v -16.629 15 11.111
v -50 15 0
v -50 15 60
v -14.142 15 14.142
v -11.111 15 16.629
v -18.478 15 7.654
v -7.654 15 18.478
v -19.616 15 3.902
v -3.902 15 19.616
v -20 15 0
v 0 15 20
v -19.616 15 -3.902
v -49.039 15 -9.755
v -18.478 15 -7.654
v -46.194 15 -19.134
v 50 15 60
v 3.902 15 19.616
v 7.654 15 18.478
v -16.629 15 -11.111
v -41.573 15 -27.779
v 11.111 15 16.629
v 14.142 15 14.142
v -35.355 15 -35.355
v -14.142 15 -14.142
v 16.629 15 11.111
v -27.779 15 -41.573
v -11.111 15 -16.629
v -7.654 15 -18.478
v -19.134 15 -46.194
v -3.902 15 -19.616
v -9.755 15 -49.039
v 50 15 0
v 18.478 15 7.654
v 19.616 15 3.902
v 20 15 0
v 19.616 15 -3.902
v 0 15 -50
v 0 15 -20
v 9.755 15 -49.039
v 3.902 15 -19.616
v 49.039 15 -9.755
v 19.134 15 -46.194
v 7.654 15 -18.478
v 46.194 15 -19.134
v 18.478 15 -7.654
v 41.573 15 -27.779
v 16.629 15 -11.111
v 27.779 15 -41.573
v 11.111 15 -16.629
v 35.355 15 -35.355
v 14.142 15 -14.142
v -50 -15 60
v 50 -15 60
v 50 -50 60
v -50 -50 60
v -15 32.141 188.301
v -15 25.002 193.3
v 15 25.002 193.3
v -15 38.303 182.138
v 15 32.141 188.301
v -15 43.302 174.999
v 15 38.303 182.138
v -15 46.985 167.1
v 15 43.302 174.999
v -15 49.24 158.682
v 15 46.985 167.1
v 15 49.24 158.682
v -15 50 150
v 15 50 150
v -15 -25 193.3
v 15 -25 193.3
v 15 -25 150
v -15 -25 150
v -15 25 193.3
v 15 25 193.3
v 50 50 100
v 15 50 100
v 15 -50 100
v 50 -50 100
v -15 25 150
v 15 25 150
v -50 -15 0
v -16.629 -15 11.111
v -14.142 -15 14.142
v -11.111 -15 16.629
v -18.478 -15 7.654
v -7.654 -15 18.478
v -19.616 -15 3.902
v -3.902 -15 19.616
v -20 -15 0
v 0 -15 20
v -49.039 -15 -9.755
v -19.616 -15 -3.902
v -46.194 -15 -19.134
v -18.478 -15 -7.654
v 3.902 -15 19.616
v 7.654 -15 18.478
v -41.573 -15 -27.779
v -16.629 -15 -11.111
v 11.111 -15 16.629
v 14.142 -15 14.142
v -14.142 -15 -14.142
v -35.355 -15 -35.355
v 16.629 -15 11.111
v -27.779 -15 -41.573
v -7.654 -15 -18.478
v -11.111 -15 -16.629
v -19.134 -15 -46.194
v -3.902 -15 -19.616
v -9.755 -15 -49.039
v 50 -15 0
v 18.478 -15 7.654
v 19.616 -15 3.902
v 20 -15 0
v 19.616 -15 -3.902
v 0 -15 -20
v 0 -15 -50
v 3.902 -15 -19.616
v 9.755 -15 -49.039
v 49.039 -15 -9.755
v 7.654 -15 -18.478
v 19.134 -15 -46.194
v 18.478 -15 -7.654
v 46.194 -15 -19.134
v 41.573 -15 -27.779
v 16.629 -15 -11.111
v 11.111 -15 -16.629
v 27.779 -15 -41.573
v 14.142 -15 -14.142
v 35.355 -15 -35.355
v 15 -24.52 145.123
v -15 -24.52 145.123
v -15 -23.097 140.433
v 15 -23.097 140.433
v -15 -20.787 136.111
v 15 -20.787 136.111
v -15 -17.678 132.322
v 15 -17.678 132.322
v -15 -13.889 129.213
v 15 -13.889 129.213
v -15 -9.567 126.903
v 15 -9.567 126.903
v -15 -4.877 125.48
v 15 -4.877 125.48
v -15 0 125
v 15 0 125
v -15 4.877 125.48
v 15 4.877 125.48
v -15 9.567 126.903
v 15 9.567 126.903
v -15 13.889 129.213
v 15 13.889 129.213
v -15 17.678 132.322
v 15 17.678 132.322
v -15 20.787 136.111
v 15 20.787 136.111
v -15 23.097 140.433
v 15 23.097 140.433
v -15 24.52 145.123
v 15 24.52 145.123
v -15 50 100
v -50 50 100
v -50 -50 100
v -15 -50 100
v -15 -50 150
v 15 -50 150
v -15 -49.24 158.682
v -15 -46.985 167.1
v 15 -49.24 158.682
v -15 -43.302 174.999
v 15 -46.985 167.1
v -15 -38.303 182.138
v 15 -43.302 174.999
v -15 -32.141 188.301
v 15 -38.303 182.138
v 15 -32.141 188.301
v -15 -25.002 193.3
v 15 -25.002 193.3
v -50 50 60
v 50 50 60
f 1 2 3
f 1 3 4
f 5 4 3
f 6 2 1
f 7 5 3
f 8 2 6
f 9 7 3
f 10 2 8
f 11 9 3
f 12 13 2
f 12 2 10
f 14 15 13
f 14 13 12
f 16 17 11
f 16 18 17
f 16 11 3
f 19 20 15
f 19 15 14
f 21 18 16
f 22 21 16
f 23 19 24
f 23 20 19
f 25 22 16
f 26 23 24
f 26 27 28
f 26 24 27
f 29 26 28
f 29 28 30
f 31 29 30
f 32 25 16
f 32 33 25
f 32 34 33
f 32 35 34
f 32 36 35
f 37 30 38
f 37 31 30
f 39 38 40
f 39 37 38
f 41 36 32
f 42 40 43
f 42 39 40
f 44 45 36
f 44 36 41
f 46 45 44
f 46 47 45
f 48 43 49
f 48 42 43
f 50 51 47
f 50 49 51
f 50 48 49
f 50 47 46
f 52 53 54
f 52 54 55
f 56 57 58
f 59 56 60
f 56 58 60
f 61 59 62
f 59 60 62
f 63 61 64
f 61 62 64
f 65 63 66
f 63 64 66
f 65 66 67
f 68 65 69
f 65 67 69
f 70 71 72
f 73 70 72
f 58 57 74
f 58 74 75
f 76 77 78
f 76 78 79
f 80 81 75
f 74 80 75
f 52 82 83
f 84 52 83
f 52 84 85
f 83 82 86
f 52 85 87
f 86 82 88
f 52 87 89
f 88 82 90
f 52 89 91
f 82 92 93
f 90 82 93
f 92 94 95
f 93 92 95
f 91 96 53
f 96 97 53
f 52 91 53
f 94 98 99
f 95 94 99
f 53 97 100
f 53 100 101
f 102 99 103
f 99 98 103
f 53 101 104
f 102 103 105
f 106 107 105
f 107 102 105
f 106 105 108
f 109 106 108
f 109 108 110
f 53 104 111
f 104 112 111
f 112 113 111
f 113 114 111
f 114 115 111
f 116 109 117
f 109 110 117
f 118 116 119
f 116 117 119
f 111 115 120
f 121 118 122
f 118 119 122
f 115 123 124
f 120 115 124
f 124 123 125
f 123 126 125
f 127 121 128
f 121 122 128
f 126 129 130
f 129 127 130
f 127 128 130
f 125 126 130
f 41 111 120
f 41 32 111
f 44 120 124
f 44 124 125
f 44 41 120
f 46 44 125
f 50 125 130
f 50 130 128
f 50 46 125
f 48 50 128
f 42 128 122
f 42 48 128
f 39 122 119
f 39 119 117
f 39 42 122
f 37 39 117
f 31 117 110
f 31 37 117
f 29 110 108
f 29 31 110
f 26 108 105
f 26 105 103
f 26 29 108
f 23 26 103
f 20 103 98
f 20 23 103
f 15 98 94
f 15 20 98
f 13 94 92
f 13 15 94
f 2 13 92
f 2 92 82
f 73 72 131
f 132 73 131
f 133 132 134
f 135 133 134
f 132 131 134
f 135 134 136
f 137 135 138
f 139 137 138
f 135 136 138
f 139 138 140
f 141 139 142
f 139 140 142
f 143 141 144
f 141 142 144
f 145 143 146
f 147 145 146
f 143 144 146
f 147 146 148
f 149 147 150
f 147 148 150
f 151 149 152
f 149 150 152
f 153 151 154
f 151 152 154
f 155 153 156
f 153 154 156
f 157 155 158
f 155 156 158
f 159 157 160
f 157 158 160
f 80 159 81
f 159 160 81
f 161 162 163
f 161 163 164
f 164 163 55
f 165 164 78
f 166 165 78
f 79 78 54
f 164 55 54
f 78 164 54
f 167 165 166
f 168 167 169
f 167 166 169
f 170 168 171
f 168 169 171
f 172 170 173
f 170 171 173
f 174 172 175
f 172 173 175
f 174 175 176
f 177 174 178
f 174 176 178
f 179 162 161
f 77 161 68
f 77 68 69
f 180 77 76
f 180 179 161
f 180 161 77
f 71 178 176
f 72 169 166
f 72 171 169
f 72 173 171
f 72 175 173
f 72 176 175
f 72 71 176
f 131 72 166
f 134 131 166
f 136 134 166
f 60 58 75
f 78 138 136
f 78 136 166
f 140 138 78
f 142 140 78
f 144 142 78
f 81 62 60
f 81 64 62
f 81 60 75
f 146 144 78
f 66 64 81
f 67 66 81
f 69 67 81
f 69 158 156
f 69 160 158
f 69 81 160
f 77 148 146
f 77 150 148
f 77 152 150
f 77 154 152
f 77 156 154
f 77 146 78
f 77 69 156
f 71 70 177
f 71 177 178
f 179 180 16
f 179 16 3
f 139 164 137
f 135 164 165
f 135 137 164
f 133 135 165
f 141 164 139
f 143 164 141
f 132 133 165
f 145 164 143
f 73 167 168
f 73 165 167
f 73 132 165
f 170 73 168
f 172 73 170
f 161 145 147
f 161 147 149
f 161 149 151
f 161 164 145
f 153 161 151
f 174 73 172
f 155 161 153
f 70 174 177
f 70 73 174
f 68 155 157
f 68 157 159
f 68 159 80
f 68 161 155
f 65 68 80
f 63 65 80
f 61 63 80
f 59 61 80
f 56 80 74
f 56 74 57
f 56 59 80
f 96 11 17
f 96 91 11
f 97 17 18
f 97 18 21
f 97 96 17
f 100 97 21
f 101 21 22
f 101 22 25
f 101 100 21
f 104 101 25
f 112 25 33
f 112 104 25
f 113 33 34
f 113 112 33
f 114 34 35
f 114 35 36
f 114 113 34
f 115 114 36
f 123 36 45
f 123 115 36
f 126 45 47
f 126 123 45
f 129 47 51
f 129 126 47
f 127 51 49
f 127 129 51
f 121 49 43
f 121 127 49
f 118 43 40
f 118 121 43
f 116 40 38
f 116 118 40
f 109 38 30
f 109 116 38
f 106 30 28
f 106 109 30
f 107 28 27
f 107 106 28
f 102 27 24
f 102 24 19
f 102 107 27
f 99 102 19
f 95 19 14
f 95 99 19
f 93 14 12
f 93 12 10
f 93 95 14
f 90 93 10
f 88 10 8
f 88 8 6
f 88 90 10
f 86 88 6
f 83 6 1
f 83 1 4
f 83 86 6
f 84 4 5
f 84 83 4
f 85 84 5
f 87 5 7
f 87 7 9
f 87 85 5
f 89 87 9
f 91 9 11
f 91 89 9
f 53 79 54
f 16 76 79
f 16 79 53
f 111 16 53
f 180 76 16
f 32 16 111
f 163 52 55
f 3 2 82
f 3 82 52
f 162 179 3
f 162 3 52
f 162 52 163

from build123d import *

# Parameters (mm, degrees)
SKETCH1_R           = 20
BOSS_EXTRUDE1_DEPTH = 15
BOSS_EXTRUDE2_DEPTH = 50
CUT_EXTRUDE1_DEPTH  = 210.975927192


with BuildPart() as part:
    # Sketch1 → Boss-Extrude1 (new, symmetric)
    with BuildSketch(Plane(origin=(0, 0, 0), x_dir=(1, 0, 0), z_dir=(0, 1, 0))):
        with BuildLine():
            ThreePointArc((50, 0), (0, 50), (-50, 0))
            Line((-50, 0), (-50, -60))
            Line((-50, -60), (50, -60))
            Line((50, -60), (50, 0))
        make_face()
        Circle(SKETCH1_R, mode=Mode.SUBTRACT)
    extrude(amount=BOSS_EXTRUDE1_DEPTH, both=True)

    # Sketch1<3> → Boss-Extrude2 (add, symmetric)
    with BuildSketch(Plane(origin=(0, 0, 0), x_dir=(1, 0, 0), z_dir=(0, 1, 0))):
        Polygon((-50, -60), (-50, -100), (-15, -100), (-15, -193.3), (15, -193.3), (15, -100), (50, -100), (50, -60), align=None)
    extrude(amount=BOSS_EXTRUDE2_DEPTH, both=True)

    # Sketch2 → Cut-Extrude1 (cut, through all)
    with BuildSketch(Plane(origin=(15, 0, 0), x_dir=(0, 0, -1), z_dir=(1, 0, 0))):
        with BuildLine():
            ThreePointArc((-150, -25), (-125, 0), (-150, 25))
            Line((-150, 25), (-193.3, 25))
            Line((-193.3, 25), (-193.3, -25))
            Line((-193.3, -25), (-150, -25))
        make_face()
        with BuildLine():
            Line((-193.3, 50), (-193.3, 25.002199903))
            ThreePointArc((-193.3, 25.002199903), (-174.998900024, 43.301905242), (-150, 50))
            Line((-150, 50), (-193.3, 50))
        make_face()
        with BuildLine():
            ThreePointArc((-150, -50), (-174.998900024, -43.301905242), (-193.3, -25.002199903))
            Line((-193.3, -25.002199903), (-193.3, -50))
            Line((-193.3, -50), (-150, -50))
        make_face()
    extrude(amount=-CUT_EXTRUDE1_DEPTH, mode=Mode.SUBTRACT)


solid = part.part
